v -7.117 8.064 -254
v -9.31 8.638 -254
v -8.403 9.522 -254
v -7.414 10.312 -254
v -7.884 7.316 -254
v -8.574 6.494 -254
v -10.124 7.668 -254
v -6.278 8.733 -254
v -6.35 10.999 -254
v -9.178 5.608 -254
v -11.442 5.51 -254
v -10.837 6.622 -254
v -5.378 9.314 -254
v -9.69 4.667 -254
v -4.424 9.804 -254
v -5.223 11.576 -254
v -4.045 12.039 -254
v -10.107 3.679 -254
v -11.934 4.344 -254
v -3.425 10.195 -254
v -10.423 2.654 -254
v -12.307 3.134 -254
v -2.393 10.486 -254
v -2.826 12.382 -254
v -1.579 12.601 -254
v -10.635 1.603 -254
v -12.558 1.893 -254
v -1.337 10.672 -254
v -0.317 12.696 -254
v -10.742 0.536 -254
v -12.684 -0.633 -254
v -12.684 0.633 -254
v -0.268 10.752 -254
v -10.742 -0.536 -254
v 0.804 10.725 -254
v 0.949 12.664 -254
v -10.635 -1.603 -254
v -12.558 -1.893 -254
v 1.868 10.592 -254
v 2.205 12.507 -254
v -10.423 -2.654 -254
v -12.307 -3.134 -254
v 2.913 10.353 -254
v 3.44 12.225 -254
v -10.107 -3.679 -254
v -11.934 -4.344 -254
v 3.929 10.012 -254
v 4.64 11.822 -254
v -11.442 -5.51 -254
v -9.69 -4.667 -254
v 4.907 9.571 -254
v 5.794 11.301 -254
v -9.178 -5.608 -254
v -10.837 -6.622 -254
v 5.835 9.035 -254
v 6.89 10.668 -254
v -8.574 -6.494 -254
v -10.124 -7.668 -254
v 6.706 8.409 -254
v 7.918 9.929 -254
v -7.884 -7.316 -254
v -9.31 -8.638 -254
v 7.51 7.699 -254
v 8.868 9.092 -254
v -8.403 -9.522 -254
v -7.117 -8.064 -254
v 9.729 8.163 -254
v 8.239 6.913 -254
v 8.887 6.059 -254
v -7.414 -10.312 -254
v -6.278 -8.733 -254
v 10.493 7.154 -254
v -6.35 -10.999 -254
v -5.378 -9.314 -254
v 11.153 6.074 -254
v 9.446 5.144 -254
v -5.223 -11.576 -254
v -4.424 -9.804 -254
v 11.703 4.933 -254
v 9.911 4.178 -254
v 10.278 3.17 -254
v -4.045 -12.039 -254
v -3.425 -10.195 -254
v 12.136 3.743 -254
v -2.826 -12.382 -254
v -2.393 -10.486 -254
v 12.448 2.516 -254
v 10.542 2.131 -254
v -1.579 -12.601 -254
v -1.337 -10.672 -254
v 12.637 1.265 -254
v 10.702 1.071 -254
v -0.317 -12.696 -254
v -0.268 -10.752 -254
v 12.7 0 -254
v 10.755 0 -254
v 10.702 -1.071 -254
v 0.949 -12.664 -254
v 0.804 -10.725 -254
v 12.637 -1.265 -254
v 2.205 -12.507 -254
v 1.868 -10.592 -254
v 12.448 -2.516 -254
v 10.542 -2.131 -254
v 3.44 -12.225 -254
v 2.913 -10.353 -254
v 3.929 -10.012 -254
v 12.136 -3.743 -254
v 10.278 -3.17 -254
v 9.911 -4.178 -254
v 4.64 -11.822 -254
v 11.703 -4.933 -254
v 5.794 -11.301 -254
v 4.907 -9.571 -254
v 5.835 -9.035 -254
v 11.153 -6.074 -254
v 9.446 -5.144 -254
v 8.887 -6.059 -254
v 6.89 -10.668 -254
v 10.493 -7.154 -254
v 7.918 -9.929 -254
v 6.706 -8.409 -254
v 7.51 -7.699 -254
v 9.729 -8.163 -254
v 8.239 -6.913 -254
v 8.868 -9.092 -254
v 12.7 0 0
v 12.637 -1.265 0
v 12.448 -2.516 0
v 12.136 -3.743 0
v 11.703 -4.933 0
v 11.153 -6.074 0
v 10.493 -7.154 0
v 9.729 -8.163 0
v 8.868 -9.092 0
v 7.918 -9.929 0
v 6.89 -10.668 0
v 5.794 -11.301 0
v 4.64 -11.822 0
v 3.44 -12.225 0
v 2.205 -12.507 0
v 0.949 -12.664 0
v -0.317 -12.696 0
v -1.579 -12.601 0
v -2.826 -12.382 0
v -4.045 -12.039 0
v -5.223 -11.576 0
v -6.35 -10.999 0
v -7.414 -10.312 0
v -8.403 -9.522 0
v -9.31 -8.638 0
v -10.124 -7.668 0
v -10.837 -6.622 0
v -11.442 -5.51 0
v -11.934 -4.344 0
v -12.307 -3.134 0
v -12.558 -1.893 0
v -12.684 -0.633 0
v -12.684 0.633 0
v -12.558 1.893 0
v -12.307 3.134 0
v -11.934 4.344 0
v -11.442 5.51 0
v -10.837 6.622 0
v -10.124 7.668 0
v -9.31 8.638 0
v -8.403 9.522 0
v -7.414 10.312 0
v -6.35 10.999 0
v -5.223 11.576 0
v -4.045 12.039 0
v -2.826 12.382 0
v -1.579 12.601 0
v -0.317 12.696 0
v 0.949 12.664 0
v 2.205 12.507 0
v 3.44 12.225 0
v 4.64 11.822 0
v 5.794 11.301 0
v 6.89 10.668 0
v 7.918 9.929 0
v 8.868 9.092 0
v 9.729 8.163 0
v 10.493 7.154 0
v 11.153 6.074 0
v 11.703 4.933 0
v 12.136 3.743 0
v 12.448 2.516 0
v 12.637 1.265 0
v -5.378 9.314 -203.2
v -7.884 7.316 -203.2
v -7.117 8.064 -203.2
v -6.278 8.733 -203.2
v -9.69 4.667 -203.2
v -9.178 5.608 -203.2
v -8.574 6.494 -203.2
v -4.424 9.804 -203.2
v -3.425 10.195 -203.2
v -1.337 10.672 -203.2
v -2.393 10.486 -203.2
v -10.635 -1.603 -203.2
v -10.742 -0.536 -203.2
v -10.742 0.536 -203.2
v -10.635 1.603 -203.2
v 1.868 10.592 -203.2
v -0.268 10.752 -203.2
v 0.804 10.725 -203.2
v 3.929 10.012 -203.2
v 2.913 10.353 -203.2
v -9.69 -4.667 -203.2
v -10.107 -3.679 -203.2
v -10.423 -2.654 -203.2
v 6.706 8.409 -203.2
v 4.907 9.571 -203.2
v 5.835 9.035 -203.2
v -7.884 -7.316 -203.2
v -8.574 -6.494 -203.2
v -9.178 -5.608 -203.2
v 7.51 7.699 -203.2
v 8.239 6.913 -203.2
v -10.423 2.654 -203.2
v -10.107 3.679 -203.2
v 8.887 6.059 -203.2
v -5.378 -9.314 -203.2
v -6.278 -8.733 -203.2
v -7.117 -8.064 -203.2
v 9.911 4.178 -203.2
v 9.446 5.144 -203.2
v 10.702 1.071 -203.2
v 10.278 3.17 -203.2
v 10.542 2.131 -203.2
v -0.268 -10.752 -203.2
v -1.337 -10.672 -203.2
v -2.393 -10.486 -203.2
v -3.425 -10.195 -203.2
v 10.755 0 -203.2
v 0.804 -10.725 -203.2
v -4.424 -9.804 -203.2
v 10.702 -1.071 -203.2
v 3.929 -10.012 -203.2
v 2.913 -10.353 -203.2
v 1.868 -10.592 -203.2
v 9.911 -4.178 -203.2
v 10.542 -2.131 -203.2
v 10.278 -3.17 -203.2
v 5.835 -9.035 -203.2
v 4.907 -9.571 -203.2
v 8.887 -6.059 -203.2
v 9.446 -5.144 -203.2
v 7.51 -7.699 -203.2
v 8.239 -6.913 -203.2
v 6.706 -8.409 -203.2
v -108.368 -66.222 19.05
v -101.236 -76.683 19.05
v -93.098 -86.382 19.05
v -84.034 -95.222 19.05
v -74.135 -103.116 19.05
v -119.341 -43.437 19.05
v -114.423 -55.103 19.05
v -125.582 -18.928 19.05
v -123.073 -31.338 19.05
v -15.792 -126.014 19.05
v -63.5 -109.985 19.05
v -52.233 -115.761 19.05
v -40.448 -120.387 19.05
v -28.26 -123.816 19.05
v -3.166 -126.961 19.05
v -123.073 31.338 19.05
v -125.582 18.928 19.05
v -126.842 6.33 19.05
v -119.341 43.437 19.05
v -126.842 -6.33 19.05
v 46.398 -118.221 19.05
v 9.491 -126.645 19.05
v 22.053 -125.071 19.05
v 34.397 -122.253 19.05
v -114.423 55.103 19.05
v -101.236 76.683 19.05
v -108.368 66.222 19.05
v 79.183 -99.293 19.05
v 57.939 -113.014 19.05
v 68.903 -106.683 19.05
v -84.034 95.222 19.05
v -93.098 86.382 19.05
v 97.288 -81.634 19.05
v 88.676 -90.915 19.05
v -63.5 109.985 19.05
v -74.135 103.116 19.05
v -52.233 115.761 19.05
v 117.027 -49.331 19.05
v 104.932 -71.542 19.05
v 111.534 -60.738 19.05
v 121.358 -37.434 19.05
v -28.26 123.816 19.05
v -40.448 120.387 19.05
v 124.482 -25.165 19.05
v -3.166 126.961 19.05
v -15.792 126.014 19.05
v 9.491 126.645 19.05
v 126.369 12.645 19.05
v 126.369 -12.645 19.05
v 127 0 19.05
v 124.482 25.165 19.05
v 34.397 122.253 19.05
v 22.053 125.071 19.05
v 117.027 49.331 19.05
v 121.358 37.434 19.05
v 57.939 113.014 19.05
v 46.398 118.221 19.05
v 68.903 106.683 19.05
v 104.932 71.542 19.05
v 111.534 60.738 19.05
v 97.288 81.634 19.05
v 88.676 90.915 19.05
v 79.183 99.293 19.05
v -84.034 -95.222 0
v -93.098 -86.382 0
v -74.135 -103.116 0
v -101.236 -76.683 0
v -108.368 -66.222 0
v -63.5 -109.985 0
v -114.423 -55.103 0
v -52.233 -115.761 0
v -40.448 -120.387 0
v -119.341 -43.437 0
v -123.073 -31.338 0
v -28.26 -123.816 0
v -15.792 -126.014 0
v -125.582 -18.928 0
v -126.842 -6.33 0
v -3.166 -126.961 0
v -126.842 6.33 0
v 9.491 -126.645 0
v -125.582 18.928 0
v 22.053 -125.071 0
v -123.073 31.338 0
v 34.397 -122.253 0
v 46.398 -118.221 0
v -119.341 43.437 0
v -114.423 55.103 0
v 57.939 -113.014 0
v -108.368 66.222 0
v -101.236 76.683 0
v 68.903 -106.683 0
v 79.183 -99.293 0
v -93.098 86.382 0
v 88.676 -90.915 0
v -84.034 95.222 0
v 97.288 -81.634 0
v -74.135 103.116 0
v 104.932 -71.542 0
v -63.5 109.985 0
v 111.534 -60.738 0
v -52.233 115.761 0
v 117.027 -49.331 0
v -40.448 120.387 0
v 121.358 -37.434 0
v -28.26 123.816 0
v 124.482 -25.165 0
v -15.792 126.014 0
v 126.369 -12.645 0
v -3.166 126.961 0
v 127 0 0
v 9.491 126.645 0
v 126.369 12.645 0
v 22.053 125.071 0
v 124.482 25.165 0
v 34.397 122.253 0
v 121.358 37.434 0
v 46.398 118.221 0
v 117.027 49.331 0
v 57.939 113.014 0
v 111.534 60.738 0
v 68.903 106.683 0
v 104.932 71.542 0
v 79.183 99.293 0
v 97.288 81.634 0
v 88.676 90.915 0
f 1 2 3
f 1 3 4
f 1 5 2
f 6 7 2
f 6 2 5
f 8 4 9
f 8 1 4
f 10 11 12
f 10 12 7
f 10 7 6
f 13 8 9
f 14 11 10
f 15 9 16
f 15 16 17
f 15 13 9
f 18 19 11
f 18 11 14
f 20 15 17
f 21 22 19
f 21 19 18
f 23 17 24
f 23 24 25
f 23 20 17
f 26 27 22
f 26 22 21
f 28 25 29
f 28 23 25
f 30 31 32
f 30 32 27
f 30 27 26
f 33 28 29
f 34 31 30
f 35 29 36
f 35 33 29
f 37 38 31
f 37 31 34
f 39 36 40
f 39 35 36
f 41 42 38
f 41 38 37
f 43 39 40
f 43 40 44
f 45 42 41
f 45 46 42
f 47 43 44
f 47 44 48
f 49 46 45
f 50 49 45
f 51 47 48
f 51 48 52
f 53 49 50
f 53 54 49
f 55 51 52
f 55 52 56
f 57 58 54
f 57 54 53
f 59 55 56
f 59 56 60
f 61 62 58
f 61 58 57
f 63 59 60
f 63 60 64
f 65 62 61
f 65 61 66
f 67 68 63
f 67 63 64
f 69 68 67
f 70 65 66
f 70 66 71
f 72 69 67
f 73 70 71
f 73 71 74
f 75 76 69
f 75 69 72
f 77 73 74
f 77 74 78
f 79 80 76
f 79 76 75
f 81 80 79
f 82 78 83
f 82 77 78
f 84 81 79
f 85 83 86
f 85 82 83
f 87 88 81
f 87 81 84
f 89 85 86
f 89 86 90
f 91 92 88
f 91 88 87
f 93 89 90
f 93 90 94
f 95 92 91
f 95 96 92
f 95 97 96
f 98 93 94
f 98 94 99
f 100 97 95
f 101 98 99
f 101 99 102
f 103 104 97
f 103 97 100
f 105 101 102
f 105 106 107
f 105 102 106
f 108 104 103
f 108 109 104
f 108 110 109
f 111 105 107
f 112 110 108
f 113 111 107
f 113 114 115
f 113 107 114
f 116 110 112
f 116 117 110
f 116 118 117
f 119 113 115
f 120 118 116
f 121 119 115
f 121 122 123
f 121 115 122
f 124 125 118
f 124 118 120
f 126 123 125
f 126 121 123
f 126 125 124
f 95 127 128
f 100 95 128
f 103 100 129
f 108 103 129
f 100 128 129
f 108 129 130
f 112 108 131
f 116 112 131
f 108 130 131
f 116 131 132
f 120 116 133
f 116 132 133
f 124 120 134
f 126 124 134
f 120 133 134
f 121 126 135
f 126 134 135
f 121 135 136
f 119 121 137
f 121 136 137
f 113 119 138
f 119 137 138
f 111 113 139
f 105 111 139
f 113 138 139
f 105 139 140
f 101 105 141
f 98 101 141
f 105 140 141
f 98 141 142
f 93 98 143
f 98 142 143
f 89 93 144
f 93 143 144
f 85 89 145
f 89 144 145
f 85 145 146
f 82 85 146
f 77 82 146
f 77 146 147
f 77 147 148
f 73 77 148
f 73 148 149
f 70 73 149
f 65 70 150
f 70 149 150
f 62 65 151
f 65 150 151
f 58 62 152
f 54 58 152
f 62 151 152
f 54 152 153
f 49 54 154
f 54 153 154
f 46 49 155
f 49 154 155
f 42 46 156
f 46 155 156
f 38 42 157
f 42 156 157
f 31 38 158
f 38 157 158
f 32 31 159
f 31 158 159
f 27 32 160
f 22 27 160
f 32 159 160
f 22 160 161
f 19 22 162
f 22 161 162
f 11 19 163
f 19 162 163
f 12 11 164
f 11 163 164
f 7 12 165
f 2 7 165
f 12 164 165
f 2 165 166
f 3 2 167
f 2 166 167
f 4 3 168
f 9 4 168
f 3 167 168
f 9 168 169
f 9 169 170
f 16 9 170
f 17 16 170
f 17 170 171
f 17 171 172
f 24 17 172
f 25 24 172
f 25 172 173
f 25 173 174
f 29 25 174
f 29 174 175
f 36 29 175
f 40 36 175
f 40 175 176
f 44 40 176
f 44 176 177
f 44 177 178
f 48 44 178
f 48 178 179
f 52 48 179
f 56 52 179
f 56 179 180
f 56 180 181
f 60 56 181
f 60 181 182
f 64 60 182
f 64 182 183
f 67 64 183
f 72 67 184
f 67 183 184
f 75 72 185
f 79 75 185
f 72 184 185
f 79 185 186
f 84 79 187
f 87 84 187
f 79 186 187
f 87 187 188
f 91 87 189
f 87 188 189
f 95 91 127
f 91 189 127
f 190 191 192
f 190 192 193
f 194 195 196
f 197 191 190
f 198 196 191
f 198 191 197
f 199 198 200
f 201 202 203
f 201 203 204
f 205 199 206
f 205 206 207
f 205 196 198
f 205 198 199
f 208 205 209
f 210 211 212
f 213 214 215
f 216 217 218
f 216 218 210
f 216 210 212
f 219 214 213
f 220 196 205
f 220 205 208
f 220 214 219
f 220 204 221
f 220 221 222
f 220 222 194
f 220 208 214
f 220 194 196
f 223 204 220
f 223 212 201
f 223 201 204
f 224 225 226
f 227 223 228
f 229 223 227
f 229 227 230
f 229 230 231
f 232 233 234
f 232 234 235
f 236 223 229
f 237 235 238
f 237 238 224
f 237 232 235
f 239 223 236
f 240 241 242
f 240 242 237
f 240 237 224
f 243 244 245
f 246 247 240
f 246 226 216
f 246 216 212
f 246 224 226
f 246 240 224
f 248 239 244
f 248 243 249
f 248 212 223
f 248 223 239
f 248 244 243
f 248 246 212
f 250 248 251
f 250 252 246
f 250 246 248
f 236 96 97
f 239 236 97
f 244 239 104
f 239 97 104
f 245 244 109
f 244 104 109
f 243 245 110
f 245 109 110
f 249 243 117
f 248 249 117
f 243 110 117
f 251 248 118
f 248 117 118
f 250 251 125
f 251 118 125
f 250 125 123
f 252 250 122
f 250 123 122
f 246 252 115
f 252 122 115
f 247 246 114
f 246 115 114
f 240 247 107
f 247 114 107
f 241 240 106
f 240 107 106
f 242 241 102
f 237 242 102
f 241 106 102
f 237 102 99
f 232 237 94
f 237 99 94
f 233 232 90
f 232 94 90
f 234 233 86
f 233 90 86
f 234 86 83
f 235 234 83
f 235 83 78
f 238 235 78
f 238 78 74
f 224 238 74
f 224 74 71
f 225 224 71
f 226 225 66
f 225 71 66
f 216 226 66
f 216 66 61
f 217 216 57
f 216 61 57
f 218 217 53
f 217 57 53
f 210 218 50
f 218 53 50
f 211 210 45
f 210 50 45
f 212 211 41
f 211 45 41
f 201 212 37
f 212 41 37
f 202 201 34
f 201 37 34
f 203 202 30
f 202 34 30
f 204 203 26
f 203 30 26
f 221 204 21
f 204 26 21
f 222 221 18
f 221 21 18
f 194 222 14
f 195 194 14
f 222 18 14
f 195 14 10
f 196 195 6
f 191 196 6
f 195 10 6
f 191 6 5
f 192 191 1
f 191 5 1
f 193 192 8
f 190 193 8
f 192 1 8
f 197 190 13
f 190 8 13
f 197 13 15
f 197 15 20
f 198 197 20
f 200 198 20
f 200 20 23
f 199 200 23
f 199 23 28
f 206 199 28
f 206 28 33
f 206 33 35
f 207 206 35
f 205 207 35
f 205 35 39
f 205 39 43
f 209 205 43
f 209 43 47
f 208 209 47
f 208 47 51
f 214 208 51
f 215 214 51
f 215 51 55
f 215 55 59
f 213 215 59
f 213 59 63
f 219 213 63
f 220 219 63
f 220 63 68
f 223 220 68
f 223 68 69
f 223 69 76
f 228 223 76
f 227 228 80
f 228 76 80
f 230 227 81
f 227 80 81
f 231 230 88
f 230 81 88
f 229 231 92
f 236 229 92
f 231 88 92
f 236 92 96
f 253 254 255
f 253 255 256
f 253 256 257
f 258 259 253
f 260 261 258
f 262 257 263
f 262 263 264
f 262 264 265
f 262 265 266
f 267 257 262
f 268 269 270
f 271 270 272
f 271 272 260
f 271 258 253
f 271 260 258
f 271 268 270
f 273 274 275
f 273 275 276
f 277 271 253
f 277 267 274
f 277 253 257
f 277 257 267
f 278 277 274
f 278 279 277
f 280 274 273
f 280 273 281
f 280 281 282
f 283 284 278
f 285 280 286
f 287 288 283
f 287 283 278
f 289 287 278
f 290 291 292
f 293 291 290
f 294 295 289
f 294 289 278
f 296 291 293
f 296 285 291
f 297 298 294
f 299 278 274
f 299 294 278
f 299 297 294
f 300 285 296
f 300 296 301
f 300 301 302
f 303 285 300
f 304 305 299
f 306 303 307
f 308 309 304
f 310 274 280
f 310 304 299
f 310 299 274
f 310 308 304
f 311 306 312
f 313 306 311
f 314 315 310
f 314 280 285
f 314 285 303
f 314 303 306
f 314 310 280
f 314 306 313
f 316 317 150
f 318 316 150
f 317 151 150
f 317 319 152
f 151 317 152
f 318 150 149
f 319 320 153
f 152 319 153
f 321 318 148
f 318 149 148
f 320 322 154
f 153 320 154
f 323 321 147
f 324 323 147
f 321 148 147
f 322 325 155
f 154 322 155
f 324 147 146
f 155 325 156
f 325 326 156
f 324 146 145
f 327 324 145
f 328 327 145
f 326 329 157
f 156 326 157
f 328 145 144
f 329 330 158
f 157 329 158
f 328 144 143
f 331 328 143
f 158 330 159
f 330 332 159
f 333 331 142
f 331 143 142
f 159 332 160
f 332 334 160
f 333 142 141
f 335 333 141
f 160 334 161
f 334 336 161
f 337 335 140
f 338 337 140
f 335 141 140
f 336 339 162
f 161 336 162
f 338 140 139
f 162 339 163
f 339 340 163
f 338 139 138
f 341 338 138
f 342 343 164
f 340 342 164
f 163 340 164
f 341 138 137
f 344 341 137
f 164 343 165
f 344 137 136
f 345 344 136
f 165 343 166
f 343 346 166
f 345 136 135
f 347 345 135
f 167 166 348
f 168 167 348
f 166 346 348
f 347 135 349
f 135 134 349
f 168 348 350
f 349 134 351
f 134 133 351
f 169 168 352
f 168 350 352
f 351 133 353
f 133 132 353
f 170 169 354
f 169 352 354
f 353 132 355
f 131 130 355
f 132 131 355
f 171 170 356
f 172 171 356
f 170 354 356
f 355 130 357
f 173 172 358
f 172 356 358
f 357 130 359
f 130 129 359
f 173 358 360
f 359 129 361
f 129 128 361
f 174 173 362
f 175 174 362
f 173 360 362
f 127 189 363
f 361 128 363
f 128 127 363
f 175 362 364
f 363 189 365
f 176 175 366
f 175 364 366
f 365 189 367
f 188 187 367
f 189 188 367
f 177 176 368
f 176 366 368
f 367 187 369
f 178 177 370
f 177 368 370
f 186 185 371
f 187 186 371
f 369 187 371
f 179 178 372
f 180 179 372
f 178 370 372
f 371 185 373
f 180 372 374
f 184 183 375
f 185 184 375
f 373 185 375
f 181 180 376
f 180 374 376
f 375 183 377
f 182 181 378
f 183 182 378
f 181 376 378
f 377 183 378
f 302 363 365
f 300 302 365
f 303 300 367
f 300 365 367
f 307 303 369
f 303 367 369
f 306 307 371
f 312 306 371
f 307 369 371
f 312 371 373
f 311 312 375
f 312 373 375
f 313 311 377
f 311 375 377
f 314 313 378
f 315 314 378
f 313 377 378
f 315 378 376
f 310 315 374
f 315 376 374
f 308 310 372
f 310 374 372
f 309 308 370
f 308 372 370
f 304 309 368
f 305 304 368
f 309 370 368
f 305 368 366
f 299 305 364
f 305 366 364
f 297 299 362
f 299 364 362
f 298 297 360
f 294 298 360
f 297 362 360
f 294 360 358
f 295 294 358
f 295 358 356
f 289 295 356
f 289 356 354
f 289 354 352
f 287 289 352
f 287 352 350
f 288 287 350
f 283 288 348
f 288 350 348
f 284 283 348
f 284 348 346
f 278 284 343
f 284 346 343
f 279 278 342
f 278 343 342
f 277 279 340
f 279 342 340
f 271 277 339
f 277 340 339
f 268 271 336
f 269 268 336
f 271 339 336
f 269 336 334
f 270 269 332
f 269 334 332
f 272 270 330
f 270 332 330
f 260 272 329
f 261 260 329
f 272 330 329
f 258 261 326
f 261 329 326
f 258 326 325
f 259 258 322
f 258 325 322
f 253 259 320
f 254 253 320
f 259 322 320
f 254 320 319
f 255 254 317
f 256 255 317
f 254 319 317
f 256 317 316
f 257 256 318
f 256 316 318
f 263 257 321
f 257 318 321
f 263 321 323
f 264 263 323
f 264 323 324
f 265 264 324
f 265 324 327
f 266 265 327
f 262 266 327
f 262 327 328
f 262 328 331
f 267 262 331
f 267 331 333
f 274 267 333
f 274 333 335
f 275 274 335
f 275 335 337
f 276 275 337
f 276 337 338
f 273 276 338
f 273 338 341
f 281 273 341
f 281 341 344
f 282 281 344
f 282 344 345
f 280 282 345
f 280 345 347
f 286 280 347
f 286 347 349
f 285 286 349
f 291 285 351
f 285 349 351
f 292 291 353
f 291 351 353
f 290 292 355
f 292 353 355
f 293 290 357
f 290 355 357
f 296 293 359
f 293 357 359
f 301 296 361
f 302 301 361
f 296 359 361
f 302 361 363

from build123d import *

# Parameters (mm, degrees)
F0_R     = 127
F1_DEPTH = 19.05
F2_R     = 12.7
F3_DEPTH = 254
F4_R     = 10.755444
F5_DEPTH = 50.8


with BuildPart() as f1:
    # F0 (on Top) → F1 (new body)
    with BuildSketch(Plane.XY):
        Circle(F0_R)
    extrude(amount=F1_DEPTH)

    # F2 (on face) → F3 (join)
    with BuildSketch(Plane(origin=(0, 0, 0), x_dir=(1, 0, 0), z_dir=(0, 0, -1))):
        Circle(F2_R)
    extrude(amount=F3_DEPTH)

    # F4 (on face) → F5 (cut)
    with BuildSketch(Plane(origin=(0, 0, -254), x_dir=(1, 0, 0), z_dir=(0, 0, -1))):
        Circle(F4_R)
    extrude(amount=-F5_DEPTH, mode=Mode.SUBTRACT)


solid = f1.part
